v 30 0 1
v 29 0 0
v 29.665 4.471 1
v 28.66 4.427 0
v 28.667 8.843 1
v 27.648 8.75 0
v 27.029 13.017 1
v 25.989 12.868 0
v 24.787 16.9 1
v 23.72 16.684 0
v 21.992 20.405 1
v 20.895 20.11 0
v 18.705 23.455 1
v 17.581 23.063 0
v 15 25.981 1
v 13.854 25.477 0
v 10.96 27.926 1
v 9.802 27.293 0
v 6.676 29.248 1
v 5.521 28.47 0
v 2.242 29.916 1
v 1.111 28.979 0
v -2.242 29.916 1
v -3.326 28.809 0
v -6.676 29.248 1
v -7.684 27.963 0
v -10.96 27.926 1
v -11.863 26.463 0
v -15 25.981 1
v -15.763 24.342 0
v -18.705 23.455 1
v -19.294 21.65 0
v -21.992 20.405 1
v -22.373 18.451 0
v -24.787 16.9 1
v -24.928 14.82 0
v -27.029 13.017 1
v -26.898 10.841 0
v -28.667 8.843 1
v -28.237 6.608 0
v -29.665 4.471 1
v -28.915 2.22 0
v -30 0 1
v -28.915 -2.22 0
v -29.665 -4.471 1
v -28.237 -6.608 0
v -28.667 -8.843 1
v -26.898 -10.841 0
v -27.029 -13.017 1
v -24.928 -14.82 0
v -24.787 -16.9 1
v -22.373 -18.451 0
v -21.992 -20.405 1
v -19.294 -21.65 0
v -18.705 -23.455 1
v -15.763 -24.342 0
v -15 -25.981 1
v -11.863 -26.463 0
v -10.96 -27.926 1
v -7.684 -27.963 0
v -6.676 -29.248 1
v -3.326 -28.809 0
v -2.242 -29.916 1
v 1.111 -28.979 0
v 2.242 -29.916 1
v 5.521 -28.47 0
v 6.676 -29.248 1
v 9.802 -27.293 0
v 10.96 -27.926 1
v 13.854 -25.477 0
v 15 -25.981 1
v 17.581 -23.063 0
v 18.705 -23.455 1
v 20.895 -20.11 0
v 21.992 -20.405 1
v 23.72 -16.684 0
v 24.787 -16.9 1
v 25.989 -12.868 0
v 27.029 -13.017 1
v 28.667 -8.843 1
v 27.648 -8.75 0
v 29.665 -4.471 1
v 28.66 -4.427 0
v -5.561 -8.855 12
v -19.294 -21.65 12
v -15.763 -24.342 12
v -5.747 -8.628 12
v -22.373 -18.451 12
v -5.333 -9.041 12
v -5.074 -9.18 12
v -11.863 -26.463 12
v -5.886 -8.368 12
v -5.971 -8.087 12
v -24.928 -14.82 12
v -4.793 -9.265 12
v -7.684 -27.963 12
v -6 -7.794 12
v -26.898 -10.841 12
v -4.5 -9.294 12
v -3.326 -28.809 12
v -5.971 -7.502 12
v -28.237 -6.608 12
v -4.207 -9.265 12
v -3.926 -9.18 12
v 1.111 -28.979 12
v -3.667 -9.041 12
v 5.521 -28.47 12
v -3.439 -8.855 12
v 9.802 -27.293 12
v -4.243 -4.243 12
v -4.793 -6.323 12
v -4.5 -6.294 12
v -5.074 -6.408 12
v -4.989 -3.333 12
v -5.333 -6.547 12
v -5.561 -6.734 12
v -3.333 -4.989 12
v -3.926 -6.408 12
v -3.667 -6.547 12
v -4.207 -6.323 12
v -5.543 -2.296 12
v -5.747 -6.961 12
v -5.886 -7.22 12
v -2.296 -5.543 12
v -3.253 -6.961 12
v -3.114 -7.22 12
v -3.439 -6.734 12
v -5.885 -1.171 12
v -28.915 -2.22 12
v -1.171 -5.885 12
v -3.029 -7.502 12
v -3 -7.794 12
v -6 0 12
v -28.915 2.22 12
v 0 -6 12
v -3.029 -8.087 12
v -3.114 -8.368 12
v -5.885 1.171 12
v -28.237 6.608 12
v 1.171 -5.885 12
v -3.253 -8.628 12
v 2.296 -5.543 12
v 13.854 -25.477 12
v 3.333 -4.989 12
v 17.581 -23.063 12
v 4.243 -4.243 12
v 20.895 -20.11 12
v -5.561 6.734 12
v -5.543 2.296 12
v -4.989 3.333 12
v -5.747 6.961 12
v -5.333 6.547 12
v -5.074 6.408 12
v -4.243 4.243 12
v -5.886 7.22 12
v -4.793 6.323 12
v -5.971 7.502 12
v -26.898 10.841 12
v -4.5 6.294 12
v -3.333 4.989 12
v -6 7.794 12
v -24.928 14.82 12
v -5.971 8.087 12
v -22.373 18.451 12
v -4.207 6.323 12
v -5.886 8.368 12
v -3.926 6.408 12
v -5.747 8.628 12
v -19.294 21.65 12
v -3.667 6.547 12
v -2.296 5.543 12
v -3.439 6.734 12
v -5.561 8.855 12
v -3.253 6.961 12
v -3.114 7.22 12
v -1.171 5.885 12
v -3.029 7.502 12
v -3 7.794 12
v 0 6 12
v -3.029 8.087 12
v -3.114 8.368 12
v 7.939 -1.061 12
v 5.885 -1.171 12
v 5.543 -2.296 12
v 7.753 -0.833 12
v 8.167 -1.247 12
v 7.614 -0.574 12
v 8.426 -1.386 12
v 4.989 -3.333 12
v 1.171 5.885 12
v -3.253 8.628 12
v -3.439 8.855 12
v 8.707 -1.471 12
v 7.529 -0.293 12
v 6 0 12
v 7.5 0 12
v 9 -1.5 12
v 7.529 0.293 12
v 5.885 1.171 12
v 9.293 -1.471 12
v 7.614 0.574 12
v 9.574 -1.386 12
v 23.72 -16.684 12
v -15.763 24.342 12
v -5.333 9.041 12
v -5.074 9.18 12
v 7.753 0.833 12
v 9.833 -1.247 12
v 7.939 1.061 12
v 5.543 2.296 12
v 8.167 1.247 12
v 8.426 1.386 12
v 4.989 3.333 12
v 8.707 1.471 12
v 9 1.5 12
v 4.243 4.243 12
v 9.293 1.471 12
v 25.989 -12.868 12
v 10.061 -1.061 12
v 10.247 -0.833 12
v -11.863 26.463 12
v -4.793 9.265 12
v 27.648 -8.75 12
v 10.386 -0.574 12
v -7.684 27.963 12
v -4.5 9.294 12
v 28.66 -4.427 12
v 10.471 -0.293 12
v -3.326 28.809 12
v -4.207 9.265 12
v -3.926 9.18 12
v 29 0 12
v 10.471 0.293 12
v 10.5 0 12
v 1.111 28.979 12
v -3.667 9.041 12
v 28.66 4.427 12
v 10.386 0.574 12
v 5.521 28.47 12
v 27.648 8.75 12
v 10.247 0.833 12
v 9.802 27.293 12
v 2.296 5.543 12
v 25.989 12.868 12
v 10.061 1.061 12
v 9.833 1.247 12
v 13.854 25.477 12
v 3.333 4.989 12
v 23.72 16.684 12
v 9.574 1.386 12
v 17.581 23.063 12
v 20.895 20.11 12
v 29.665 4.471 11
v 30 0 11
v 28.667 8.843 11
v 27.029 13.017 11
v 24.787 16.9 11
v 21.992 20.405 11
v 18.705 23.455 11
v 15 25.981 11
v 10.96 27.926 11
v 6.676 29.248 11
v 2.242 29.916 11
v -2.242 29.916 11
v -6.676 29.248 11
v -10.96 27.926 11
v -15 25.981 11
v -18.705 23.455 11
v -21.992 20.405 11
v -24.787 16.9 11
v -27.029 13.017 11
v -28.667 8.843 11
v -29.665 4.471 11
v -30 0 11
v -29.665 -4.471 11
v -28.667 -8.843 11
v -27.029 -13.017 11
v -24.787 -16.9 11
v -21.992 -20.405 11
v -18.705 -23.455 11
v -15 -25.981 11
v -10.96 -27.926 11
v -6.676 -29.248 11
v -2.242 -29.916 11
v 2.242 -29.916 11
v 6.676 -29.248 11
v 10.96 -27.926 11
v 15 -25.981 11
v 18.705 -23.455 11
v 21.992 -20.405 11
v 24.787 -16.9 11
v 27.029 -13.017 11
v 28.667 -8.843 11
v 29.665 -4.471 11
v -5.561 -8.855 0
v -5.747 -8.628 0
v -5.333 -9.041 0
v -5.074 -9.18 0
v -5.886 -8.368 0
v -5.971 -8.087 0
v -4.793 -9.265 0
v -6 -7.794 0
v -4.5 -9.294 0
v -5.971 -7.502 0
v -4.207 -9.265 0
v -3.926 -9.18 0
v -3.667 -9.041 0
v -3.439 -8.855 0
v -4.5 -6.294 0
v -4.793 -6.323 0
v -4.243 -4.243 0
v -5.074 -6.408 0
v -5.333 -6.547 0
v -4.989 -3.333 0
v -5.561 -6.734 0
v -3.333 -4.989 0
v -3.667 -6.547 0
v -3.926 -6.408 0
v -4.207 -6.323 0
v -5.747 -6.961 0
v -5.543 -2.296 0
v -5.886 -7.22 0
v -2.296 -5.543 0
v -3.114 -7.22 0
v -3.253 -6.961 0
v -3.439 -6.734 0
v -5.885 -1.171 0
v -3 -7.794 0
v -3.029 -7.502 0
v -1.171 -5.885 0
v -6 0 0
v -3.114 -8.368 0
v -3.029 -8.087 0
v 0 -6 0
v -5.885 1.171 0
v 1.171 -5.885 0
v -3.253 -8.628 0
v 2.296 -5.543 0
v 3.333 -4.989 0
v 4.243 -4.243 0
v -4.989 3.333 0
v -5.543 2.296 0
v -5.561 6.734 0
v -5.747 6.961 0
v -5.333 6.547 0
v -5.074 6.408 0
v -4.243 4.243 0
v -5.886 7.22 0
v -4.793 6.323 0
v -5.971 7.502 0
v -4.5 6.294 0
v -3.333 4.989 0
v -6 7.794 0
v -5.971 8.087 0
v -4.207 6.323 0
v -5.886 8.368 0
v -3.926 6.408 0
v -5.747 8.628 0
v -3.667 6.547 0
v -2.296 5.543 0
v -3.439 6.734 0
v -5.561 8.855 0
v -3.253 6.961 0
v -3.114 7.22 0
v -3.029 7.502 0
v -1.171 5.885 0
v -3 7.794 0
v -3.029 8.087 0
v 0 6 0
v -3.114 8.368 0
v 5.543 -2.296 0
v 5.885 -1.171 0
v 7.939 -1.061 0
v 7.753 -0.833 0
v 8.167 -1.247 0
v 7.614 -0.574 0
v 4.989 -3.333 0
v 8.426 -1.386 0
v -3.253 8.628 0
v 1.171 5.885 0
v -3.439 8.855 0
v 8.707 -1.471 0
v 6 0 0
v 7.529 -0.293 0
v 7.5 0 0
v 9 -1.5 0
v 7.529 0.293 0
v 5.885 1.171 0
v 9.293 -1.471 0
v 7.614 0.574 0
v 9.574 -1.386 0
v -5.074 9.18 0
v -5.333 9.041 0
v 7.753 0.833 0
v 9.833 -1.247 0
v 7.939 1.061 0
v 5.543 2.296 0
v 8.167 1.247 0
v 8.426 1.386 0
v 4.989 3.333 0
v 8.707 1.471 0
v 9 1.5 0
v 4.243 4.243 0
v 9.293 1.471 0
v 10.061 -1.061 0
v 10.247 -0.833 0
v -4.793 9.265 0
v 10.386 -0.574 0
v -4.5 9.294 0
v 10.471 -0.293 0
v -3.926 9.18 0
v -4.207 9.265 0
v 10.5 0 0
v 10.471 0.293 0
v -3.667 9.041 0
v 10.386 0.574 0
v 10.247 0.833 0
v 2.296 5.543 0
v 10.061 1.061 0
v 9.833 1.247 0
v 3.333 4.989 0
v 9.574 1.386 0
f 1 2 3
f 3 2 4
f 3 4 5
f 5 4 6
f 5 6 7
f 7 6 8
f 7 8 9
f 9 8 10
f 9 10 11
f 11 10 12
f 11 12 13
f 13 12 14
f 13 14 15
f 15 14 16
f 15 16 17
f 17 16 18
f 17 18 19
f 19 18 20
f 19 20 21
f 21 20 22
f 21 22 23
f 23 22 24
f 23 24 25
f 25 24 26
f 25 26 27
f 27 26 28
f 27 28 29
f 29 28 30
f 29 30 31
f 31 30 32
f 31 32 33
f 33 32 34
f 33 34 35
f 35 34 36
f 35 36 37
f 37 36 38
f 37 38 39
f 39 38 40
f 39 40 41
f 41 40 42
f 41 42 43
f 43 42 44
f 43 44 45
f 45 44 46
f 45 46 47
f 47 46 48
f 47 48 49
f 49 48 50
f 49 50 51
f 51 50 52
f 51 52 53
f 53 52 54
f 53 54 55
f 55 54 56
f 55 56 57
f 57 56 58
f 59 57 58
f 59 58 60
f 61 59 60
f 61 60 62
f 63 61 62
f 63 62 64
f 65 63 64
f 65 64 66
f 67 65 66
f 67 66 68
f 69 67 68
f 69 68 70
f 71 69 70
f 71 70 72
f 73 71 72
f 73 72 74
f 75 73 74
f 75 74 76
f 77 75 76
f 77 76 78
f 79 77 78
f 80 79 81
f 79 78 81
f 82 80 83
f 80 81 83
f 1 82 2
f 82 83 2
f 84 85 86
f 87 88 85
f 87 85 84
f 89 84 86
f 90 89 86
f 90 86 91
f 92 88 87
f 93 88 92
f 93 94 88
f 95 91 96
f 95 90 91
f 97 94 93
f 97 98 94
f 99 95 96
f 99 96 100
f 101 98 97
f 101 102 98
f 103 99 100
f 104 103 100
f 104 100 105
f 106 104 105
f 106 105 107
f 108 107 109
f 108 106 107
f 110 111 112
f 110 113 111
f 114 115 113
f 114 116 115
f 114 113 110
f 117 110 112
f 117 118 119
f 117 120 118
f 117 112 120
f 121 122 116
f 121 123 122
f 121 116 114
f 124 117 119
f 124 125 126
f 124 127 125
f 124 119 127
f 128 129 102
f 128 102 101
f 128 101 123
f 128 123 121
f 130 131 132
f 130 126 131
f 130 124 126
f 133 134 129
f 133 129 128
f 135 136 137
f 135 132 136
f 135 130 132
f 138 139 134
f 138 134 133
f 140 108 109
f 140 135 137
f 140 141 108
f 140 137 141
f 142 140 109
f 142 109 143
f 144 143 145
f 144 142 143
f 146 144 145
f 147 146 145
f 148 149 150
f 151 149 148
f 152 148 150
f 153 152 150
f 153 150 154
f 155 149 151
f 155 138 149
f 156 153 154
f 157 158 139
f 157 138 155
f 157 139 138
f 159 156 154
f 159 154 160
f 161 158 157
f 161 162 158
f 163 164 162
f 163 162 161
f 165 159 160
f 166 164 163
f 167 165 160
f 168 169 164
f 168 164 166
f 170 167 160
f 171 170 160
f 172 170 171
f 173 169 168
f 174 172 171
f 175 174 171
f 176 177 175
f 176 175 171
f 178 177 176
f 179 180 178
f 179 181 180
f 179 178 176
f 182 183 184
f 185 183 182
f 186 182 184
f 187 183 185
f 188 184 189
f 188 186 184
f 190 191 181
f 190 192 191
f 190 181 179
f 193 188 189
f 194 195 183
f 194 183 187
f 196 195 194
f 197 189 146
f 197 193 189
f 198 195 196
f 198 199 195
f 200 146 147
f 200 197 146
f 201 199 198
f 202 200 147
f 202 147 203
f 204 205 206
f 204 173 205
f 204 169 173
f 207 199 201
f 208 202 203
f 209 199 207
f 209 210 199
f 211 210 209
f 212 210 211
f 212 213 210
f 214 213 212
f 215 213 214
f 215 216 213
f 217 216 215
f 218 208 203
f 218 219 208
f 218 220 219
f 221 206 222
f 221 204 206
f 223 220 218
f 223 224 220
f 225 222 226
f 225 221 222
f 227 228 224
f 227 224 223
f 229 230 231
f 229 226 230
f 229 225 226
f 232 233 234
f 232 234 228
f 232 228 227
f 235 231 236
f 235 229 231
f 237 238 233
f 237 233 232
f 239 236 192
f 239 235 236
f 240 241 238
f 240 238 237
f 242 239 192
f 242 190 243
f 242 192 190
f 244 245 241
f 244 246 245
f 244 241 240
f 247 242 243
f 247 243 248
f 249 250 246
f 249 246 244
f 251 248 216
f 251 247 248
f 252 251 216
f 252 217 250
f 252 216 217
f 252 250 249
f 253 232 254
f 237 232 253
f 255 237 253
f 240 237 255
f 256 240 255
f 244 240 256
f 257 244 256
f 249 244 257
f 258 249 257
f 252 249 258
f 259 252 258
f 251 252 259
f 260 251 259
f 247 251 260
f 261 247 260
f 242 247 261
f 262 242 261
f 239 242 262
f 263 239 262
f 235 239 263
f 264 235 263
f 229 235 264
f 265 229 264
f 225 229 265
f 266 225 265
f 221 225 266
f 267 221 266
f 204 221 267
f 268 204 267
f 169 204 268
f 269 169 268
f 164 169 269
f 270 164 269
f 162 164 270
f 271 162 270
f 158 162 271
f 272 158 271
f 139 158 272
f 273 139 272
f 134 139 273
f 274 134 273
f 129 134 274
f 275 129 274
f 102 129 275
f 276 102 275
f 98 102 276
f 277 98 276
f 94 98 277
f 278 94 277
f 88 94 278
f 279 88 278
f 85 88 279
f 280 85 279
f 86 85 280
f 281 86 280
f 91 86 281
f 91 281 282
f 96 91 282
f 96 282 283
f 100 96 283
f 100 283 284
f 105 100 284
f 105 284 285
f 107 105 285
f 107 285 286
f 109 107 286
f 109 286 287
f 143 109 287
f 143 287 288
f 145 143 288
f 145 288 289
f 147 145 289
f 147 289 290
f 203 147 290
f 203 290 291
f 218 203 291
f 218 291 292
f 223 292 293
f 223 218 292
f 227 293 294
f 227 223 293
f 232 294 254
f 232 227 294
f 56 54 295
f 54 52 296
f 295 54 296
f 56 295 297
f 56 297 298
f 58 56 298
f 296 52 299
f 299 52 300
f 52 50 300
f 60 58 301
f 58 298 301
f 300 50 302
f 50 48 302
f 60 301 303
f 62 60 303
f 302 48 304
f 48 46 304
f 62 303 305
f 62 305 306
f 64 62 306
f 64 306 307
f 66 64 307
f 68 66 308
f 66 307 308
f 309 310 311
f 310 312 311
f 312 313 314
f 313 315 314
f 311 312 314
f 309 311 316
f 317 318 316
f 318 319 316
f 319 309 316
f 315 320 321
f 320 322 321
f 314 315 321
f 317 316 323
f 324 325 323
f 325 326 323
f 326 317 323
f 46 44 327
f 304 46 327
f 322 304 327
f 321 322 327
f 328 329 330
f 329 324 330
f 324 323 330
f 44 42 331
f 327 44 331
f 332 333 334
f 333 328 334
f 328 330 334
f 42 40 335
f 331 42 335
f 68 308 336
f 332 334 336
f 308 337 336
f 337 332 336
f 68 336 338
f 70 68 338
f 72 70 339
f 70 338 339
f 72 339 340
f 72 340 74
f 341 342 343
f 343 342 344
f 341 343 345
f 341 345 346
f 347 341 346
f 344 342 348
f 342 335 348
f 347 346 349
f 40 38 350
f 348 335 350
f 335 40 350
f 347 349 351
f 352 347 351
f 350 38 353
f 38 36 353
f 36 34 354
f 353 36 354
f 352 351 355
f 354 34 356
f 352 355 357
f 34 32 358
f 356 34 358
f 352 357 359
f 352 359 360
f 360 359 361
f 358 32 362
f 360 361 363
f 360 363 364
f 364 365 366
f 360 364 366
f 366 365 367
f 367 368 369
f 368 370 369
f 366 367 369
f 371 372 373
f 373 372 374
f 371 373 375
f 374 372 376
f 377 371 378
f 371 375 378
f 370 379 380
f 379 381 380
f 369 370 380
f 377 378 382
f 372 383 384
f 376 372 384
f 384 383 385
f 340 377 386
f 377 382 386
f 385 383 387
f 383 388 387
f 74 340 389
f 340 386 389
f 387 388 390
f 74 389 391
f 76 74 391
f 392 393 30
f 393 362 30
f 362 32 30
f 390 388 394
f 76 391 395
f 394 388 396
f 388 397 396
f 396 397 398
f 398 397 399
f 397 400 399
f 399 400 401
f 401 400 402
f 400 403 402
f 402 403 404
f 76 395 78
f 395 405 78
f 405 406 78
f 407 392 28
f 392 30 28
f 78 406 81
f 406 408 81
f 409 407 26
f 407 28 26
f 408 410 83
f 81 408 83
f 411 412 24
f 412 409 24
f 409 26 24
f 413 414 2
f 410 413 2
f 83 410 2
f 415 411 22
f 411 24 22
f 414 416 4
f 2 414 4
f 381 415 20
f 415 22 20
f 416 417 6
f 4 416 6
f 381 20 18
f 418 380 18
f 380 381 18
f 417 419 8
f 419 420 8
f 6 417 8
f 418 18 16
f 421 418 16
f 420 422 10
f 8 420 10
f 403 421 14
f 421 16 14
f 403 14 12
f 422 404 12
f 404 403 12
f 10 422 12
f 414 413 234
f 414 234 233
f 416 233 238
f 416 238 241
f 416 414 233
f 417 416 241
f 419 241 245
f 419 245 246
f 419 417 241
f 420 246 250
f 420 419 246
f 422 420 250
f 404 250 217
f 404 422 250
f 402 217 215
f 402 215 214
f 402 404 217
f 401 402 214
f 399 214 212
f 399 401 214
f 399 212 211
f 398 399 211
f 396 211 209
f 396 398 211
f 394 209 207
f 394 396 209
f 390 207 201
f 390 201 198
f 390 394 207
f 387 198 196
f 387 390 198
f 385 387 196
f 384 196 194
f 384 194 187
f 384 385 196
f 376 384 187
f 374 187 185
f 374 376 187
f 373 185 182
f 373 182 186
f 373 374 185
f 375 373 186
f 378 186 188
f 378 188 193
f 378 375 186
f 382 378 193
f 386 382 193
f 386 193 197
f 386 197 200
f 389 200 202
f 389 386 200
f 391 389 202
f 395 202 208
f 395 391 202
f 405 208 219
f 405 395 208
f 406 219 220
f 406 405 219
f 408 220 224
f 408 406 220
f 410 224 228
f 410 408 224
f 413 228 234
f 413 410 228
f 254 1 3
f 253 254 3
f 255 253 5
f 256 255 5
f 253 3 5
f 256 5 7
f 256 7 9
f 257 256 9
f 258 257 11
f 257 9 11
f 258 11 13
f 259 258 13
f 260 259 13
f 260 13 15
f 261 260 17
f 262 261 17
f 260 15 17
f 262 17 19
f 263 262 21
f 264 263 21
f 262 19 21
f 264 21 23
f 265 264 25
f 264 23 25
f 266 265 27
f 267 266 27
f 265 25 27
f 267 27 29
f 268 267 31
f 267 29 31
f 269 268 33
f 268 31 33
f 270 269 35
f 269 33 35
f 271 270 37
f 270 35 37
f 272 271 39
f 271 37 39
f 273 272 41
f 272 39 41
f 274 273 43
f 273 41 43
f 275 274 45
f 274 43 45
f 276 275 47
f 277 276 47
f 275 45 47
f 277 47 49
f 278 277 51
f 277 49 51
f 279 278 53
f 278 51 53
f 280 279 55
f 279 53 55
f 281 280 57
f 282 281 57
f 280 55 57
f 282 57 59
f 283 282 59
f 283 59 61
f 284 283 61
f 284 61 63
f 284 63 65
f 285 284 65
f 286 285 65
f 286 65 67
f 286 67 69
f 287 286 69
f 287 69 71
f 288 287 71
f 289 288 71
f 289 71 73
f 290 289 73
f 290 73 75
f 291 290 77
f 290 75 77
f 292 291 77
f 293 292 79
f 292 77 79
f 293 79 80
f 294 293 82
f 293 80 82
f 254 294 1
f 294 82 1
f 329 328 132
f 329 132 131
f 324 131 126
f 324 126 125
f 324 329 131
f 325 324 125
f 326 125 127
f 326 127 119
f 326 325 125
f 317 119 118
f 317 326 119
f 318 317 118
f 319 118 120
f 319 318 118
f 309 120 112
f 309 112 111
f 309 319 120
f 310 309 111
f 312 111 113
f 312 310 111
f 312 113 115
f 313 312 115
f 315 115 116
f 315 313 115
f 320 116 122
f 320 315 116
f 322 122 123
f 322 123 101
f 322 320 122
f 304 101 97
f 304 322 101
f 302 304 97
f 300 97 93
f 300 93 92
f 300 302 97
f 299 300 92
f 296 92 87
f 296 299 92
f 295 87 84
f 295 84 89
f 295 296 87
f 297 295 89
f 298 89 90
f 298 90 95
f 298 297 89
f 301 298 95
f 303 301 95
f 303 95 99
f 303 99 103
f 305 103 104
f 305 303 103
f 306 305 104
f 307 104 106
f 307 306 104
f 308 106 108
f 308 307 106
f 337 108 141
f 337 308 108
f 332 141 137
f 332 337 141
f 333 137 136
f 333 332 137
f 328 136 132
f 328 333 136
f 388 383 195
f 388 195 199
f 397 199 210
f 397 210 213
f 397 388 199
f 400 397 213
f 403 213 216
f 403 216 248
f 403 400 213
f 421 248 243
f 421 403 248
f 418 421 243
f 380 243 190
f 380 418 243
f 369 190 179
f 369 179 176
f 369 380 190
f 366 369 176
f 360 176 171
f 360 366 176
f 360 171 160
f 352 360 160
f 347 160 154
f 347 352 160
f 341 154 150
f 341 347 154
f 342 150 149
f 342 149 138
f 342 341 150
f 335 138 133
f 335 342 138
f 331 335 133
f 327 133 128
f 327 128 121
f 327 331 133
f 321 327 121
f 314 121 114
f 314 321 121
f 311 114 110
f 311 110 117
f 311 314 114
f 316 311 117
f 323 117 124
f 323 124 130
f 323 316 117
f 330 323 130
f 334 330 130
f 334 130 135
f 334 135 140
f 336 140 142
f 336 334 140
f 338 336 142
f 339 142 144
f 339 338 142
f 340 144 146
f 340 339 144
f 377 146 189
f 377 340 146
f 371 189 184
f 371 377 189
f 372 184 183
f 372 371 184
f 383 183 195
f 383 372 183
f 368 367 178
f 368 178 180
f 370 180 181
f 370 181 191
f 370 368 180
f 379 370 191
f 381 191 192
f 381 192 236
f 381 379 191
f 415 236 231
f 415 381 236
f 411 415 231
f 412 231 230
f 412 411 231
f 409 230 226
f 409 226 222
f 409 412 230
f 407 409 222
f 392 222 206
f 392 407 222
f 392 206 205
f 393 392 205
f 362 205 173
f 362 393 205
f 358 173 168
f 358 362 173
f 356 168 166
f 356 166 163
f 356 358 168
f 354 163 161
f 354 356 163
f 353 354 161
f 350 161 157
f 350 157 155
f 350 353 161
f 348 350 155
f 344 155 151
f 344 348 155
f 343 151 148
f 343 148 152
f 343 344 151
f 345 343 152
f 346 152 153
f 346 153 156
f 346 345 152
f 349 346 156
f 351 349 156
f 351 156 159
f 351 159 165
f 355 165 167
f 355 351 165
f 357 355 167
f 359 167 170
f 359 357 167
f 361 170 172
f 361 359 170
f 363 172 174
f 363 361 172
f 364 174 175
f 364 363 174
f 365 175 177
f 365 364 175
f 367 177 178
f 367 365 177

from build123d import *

# Parameters (mm, degrees)
SKETCH1_R           = 30
SKETCH1_R_2         = 6
SKETCH1_R_3         = 1.5
BOSS_EXTRUDE1_DEPTH = 12
CHAMFER1_SIZE       = 1


with BuildPart() as part:
    # Sketch1 → Boss-Extrude1 (new body)
    with BuildSketch(Plane.XY):
        Circle(SKETCH1_R)
        Circle(SKETCH1_R_2, mode=Mode.SUBTRACT)
        with Locations((9, 0)):
            Circle(SKETCH1_R_3, mode=Mode.SUBTRACT)
        with Locations((-4.5, -7.794228634)):
            Circle(SKETCH1_R_3, mode=Mode.SUBTRACT)
        with Locations((-4.5, 7.794228634)):
            Circle(SKETCH1_R_3, mode=Mode.SUBTRACT)
    extrude(amount=BOSS_EXTRUDE1_DEPTH)

    # Chamfer1
    chamfer1_edges = [part.edges().sort_by_distance(p)[0] for p in [
        (-30, 0, 0),
        (-30, 0, 12),
    ]]
    chamfer(chamfer1_edges, length=CHAMFER1_SIZE)


solid = part.part
